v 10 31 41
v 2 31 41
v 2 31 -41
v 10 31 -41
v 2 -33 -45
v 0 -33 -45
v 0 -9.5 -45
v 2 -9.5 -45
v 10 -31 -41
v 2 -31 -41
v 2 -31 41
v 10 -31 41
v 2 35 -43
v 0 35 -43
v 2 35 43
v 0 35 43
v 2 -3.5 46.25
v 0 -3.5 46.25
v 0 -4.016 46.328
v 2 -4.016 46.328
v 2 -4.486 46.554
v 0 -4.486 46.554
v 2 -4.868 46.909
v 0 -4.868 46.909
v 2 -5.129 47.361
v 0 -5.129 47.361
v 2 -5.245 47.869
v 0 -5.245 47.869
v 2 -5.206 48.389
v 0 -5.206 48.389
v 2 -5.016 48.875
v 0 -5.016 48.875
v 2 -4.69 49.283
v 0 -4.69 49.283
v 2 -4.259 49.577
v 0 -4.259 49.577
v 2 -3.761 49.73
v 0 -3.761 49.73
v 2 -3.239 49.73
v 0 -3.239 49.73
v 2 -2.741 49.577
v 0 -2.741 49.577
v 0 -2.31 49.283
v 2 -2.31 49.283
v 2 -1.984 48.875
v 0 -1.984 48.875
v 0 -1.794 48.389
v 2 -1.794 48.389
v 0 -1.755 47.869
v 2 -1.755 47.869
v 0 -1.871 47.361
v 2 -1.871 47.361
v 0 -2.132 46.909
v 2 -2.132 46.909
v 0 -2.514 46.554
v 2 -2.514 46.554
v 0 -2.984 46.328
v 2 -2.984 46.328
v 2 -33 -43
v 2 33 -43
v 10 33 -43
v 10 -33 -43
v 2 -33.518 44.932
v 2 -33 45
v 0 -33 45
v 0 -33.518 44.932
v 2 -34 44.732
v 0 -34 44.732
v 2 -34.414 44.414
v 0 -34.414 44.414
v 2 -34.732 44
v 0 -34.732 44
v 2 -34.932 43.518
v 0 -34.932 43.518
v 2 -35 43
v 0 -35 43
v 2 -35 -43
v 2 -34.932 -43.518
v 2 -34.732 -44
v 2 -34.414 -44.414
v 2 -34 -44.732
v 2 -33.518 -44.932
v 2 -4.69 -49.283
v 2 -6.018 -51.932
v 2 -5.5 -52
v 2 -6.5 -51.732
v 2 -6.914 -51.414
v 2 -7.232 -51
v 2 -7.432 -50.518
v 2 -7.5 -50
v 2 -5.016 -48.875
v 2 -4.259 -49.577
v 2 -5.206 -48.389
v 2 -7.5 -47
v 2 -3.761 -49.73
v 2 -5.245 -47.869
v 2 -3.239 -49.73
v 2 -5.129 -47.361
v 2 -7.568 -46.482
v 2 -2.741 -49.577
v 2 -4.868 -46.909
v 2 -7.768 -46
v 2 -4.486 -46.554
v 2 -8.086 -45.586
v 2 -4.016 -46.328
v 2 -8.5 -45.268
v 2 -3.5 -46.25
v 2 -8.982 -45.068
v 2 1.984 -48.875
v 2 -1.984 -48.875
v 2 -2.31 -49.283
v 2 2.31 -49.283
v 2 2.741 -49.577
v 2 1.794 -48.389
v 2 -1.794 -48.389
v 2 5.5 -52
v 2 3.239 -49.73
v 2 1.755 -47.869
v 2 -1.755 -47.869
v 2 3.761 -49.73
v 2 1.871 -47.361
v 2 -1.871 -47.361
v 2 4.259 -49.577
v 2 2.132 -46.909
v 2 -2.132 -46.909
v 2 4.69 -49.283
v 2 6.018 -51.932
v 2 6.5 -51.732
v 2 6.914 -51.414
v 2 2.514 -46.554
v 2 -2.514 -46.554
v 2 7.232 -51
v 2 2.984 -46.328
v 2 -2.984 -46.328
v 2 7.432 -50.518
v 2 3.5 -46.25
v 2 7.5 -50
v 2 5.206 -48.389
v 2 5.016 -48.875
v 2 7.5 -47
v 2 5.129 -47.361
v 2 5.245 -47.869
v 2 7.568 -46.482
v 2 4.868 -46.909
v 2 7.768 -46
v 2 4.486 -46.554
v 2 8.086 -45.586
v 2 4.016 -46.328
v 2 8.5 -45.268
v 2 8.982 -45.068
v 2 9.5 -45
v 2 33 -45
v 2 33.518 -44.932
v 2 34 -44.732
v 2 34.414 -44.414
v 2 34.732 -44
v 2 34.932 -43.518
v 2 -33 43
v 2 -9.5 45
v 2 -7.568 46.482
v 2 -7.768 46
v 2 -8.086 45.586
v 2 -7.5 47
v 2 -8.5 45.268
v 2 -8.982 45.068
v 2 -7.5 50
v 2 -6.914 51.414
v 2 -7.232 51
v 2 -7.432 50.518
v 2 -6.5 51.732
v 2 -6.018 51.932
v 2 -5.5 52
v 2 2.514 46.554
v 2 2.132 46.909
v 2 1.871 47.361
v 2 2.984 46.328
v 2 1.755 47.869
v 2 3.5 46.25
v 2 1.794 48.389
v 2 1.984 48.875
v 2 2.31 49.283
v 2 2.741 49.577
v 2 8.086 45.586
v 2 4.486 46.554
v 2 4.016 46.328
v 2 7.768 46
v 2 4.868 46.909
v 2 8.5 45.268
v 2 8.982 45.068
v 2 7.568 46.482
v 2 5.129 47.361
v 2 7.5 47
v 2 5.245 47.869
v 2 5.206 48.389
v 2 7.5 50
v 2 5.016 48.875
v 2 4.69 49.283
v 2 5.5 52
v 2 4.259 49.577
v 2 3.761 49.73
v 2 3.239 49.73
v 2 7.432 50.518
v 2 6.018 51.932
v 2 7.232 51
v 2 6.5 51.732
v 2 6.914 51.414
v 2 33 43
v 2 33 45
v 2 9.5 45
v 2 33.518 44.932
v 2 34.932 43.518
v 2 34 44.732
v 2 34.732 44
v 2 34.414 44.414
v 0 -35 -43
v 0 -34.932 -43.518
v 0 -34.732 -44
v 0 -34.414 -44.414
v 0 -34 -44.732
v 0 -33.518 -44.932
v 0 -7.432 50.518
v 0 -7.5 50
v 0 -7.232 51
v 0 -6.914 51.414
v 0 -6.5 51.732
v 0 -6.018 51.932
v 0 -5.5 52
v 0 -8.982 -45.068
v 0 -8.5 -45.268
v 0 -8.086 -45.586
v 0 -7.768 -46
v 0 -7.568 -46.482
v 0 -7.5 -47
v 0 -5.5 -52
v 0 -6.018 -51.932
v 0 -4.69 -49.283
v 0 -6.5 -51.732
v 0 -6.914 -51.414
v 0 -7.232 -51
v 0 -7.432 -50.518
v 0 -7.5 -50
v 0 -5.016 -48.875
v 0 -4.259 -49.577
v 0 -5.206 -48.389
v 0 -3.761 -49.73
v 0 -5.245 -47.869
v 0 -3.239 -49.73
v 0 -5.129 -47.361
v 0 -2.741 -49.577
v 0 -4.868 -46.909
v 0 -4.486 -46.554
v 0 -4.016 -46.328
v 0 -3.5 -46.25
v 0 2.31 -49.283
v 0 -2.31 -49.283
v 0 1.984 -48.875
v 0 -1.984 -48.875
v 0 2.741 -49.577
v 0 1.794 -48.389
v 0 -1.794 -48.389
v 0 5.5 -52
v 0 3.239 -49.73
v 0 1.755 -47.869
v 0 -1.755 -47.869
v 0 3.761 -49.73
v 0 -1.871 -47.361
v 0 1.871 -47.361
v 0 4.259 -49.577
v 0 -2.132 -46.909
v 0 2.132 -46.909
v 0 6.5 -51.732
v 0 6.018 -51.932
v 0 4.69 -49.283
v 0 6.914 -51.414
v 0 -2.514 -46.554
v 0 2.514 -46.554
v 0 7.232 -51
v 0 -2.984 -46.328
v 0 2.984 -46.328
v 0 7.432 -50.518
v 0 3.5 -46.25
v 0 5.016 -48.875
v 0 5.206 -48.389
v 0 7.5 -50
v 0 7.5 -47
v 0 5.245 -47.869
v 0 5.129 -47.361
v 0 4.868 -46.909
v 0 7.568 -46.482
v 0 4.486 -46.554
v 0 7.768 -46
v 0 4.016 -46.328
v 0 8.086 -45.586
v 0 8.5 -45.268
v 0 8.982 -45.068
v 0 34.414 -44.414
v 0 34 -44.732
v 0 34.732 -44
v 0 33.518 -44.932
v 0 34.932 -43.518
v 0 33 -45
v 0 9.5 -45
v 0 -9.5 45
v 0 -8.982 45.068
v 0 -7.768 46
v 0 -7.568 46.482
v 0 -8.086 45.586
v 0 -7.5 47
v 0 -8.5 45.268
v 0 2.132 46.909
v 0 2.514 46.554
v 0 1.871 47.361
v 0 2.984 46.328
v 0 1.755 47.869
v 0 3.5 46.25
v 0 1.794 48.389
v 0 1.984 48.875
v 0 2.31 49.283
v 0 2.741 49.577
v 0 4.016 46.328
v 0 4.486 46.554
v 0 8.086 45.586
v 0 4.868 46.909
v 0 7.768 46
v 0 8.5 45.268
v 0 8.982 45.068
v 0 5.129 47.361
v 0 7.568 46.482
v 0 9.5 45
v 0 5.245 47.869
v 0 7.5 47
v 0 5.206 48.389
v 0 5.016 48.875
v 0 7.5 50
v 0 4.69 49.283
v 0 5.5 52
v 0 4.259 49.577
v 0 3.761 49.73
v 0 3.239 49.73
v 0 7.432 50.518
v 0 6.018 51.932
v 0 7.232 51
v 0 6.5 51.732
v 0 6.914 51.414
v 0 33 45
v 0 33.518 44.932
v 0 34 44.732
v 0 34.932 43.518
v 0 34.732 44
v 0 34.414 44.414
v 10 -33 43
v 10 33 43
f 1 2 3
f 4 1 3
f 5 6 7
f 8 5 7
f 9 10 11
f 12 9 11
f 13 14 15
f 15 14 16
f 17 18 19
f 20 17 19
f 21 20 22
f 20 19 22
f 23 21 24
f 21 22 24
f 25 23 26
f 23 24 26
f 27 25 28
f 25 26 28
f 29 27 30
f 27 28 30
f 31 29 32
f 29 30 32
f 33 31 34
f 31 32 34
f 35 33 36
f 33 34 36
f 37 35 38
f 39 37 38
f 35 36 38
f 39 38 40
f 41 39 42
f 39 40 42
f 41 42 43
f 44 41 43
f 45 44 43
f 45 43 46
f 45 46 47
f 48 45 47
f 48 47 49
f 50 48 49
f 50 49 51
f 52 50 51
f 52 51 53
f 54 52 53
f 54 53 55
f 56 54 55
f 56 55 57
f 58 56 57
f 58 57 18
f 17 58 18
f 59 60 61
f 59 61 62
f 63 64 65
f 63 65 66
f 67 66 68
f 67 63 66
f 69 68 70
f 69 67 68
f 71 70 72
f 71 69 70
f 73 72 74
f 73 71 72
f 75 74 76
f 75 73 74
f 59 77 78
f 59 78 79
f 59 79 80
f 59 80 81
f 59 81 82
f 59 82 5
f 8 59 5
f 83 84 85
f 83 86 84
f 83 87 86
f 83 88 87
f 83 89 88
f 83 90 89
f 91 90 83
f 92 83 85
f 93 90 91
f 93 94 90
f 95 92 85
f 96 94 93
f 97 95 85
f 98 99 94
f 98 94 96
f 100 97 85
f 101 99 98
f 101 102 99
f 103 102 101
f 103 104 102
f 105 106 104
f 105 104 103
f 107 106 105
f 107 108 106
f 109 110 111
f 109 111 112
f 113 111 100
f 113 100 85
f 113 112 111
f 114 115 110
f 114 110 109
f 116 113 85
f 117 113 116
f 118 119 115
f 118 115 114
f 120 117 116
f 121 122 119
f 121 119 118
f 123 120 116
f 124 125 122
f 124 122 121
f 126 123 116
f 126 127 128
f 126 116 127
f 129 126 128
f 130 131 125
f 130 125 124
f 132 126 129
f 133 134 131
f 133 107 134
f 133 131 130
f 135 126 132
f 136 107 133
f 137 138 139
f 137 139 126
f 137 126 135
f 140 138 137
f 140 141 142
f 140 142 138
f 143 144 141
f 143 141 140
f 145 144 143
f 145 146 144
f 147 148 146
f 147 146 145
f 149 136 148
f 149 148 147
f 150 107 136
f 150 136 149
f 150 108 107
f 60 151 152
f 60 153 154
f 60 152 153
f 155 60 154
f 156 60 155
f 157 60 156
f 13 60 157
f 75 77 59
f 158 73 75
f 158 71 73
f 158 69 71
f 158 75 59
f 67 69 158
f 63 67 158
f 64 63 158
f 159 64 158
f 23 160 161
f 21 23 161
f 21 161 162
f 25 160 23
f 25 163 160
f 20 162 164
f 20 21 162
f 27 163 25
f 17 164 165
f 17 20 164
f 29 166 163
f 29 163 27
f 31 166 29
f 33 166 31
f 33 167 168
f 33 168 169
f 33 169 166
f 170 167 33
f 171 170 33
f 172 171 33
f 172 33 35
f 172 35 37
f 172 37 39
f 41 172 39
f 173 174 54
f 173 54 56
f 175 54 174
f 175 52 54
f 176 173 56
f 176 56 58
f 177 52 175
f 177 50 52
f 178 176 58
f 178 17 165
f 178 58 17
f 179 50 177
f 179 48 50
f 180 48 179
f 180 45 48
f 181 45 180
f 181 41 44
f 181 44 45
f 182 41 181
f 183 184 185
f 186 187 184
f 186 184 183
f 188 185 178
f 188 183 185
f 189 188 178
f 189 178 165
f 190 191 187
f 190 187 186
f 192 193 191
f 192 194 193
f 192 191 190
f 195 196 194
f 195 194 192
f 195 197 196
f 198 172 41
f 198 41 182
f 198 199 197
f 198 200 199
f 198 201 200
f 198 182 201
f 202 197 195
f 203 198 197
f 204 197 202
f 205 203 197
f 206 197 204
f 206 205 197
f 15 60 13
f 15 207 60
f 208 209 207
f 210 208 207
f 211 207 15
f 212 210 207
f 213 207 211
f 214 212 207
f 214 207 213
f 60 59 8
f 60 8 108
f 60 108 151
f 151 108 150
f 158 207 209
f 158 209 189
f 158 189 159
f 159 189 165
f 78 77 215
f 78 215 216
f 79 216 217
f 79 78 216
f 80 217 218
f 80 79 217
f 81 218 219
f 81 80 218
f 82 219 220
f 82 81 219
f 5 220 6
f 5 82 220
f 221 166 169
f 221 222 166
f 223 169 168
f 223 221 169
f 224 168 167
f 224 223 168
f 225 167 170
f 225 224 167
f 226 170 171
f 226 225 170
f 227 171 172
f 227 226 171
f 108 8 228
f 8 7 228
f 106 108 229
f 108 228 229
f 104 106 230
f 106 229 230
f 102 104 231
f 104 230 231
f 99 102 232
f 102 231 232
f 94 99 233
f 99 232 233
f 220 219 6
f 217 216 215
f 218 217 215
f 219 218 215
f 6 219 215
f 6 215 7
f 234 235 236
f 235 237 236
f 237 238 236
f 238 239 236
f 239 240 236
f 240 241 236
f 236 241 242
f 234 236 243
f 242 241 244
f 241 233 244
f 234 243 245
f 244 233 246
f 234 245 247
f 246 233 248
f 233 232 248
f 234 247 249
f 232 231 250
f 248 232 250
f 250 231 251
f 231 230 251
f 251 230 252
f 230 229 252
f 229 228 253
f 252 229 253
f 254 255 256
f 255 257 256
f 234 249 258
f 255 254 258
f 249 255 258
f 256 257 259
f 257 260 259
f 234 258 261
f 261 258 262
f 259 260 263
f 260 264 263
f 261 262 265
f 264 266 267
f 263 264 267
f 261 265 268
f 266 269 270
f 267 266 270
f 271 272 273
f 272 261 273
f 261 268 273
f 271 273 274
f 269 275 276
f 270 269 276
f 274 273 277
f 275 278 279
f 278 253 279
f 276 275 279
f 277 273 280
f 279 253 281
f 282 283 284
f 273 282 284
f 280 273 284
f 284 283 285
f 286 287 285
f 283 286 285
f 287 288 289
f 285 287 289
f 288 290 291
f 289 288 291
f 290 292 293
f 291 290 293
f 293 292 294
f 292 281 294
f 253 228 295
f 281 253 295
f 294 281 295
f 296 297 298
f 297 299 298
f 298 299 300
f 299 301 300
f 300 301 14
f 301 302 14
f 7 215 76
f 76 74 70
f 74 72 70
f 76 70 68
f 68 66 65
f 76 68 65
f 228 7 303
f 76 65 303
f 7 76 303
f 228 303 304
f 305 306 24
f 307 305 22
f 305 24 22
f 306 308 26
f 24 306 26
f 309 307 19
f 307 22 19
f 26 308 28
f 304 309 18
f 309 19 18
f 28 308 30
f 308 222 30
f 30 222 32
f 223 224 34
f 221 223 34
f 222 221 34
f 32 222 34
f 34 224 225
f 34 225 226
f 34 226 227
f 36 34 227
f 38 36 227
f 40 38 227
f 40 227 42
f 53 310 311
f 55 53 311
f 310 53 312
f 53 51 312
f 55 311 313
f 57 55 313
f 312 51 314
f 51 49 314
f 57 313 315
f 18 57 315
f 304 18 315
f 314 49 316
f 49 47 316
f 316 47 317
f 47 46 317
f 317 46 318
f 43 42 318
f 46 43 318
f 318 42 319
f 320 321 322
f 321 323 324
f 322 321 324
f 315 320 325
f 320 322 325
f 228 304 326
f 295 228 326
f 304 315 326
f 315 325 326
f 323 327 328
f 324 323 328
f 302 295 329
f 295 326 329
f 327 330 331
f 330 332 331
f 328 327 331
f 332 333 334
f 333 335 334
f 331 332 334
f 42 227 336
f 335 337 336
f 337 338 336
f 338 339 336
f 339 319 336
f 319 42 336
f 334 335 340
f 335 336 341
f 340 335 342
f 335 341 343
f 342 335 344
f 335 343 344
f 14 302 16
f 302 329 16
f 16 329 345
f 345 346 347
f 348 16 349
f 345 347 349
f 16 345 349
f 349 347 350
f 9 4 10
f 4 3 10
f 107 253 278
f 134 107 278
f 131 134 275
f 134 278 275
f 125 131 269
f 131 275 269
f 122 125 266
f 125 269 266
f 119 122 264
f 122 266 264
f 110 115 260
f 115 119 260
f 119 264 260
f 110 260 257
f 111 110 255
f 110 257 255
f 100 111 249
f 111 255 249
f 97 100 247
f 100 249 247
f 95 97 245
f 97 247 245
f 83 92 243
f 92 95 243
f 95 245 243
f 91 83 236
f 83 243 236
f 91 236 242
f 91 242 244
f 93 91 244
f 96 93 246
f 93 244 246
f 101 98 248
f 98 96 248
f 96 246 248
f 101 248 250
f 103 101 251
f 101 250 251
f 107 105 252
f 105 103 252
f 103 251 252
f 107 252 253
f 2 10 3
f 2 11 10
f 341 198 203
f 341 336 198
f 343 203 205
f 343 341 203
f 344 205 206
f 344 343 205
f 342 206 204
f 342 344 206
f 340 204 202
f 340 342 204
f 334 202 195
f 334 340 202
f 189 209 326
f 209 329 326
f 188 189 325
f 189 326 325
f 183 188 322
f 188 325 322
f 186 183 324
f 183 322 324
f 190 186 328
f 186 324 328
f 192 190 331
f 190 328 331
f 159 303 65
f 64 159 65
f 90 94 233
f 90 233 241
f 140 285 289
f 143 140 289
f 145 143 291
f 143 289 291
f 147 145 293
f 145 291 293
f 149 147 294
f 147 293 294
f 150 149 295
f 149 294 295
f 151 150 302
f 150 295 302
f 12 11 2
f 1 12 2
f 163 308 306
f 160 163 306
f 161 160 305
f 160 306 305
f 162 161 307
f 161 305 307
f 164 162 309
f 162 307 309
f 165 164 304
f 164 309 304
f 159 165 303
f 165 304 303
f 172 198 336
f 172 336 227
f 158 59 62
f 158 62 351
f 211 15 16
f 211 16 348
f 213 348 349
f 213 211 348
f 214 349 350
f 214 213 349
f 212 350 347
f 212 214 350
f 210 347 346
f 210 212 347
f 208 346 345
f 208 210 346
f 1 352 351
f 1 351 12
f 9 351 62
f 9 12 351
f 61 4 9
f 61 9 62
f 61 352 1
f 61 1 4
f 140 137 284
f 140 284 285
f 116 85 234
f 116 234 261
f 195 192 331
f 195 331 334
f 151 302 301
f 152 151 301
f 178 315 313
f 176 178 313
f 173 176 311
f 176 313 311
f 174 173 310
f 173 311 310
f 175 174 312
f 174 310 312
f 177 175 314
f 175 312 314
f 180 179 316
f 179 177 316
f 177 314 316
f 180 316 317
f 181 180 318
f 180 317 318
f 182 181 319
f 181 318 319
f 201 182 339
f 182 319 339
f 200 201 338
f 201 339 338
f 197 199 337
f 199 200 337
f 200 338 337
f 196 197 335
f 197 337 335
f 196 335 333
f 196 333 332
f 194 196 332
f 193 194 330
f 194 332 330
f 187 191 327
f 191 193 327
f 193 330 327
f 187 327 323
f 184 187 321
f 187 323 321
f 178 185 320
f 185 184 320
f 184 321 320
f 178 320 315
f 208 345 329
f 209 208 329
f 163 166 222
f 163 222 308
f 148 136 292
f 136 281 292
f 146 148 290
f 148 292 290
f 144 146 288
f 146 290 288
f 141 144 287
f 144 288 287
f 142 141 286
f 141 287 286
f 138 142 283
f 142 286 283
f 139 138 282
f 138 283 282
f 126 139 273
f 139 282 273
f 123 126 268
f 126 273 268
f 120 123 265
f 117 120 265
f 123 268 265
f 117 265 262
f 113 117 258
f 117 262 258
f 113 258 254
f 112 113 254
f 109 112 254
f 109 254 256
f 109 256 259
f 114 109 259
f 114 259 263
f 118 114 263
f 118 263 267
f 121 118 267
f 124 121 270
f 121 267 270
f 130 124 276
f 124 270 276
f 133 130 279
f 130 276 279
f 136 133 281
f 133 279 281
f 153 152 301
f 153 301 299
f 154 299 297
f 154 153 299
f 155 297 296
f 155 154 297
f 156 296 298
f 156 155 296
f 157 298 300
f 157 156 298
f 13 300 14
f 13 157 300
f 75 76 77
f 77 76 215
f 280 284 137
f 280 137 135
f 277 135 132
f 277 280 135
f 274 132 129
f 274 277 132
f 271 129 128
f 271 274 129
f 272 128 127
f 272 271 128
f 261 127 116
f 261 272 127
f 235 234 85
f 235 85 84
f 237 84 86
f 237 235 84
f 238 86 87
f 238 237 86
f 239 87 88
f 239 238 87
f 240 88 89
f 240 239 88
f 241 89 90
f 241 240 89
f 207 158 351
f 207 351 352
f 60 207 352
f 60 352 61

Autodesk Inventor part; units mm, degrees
ref_plane "YZ Plane" through (0, 0, 0) normal (1, 0, 0) x (0, 1, 0)
ref_plane "XZ Plane" through (0, 0, 0) normal (0, 1, 0) x (-1, 0, 0)
ref_plane "XY Plane" through (0, 0, 0) normal (0, 0, 1) x (1, 0, 0)
sketch "Esquisse1" plane through (0, 0, 0) normal (1, 0, 0) x (0, 1, 0)
  line L0 (35, 45) -> (-35, 45)
  line L1 (-35, 45) -> (-35, -45)
  line L2 (-35, -45) -> (35, -45)
  line L3 (35, -45) -> (35, 45)
  line L4 (26.5459, 0) -> (-33.52, 0) construction
  line L5 (0, 24.5499) -> (0, -29.9835) construction
  point P0 (0, 0)
  dimension "d0" = 90
  dimension "d1" = 70
extrude "Extrusion1" add sketch "Esquisse1" along normal blind 2
sketch "Esquisse2" plane through (2, 0, 0) normal (1, 0, 0) x (0, 0, -1)
  line L0 (-43, 33) -> (43, 33)
  line L1 (43, 33) -> (43, -33)
  line L2 (43, -33) -> (-43, -33)
  line L3 (-43, -33) -> (-43, 33)
  line L4 (-41, 31) -> (41, 31)
  line L5 (41, 31) -> (41, -31)
  line L6 (41, -31) -> (-41, -31)
  line L7 (-41, -31) -> (-41, 31)
  line L8 (45, 35) -> (-45, 35) projected
  line L9 (-45, 35) -> (-45, -35) projected
  line L10 (-45, -35) -> (45, -35) projected
  line L11 (45, -35) -> (45, 35) projected
  dimension "d4" = 2
  dimension "d5" = 2
  dimension "d6" = 2
  dimension "d7" = 2
  dimension "d8" = 2
  dimension "d9" = 2
  dimension "d10" = 2
  dimension "d11" = 2
extrude "Extrusion2" add sketch "Esquisse2" along normal blind 8 contours L0 L1 L2 L3
sketch "Esquisse3" plane through (0, -35, -45) normal (0, 0, -1) x (-1, 0, 0)
  point P0 (0, 35)
sketch "Esquisse4" plane through (2, 0, 0) normal (1, 0, 0) x (0, 0, -1)
  line L0 (45, -35) -> (45, 35) projected
  line L1 (45, -7.5) -> (52, -7.5)
  line L2 (52, -7.5) -> (52, 7.5)
  line L3 (52, 7.5) -> (45, 7.5)
  line L4 (45, 7.5) -> (45, -7.5)
  point P0 (0, 0)
  dimension "d14" = 15
  dimension "d15" = 7
  dimension "d16" = 27.5
extrude "Extrusion3" add sketch "Esquisse4" against normal blind 2
fillet "Congé1" radius 2 5 edges at (1, 35, -45) (1, 7.5, -52) (1, -7.5, -52) (1, 7.5, -45) (1, -35, -45)
fillet "Congé2" radius 2 1 edges at (1, -7.5, -45)
mirror "Mise en miroir1" about plane through (0, 0, 0) normal (0, 0, 1) of "Extrusion3"
fillet "Congé3" radius 2 5 edges at (1, -35, 45) (1, -7.5, 45) (1, -7.5, 52) (1, 7.5, 52) (1, 35, 45)
fillet "Congé4" radius 2 1 edges at (1, 7.5, 45)
sketch "Esquisse5" plane through (0, 0, 0) normal (-1, 0, 0) x (0, 0, 1)
  circle A0 centre (-48, 3.5) radius 1.75
  line L0 (-52, 5.5) -> (-52, -5.5) projected
  line L1 (-47, 7.5) -> (-50, 7.5) projected
  point P0 (0, 0)
  dimension "d23" = 3.5
  dimension "d24" = 4
  dimension "d25" = 4
extrude "Extrusion4" cut sketch "Esquisse5" against normal blind 2
mirror "Mise en miroir2" about plane through (0, 0, 0) normal (0, 1, 0) of "Extrusion4"
mirror "Mise en miroir3" about plane through (0, 0, 0) normal (0, 0, 1) of "Extrusion4", "Mise en miroir2"
properties part number "Couv"
